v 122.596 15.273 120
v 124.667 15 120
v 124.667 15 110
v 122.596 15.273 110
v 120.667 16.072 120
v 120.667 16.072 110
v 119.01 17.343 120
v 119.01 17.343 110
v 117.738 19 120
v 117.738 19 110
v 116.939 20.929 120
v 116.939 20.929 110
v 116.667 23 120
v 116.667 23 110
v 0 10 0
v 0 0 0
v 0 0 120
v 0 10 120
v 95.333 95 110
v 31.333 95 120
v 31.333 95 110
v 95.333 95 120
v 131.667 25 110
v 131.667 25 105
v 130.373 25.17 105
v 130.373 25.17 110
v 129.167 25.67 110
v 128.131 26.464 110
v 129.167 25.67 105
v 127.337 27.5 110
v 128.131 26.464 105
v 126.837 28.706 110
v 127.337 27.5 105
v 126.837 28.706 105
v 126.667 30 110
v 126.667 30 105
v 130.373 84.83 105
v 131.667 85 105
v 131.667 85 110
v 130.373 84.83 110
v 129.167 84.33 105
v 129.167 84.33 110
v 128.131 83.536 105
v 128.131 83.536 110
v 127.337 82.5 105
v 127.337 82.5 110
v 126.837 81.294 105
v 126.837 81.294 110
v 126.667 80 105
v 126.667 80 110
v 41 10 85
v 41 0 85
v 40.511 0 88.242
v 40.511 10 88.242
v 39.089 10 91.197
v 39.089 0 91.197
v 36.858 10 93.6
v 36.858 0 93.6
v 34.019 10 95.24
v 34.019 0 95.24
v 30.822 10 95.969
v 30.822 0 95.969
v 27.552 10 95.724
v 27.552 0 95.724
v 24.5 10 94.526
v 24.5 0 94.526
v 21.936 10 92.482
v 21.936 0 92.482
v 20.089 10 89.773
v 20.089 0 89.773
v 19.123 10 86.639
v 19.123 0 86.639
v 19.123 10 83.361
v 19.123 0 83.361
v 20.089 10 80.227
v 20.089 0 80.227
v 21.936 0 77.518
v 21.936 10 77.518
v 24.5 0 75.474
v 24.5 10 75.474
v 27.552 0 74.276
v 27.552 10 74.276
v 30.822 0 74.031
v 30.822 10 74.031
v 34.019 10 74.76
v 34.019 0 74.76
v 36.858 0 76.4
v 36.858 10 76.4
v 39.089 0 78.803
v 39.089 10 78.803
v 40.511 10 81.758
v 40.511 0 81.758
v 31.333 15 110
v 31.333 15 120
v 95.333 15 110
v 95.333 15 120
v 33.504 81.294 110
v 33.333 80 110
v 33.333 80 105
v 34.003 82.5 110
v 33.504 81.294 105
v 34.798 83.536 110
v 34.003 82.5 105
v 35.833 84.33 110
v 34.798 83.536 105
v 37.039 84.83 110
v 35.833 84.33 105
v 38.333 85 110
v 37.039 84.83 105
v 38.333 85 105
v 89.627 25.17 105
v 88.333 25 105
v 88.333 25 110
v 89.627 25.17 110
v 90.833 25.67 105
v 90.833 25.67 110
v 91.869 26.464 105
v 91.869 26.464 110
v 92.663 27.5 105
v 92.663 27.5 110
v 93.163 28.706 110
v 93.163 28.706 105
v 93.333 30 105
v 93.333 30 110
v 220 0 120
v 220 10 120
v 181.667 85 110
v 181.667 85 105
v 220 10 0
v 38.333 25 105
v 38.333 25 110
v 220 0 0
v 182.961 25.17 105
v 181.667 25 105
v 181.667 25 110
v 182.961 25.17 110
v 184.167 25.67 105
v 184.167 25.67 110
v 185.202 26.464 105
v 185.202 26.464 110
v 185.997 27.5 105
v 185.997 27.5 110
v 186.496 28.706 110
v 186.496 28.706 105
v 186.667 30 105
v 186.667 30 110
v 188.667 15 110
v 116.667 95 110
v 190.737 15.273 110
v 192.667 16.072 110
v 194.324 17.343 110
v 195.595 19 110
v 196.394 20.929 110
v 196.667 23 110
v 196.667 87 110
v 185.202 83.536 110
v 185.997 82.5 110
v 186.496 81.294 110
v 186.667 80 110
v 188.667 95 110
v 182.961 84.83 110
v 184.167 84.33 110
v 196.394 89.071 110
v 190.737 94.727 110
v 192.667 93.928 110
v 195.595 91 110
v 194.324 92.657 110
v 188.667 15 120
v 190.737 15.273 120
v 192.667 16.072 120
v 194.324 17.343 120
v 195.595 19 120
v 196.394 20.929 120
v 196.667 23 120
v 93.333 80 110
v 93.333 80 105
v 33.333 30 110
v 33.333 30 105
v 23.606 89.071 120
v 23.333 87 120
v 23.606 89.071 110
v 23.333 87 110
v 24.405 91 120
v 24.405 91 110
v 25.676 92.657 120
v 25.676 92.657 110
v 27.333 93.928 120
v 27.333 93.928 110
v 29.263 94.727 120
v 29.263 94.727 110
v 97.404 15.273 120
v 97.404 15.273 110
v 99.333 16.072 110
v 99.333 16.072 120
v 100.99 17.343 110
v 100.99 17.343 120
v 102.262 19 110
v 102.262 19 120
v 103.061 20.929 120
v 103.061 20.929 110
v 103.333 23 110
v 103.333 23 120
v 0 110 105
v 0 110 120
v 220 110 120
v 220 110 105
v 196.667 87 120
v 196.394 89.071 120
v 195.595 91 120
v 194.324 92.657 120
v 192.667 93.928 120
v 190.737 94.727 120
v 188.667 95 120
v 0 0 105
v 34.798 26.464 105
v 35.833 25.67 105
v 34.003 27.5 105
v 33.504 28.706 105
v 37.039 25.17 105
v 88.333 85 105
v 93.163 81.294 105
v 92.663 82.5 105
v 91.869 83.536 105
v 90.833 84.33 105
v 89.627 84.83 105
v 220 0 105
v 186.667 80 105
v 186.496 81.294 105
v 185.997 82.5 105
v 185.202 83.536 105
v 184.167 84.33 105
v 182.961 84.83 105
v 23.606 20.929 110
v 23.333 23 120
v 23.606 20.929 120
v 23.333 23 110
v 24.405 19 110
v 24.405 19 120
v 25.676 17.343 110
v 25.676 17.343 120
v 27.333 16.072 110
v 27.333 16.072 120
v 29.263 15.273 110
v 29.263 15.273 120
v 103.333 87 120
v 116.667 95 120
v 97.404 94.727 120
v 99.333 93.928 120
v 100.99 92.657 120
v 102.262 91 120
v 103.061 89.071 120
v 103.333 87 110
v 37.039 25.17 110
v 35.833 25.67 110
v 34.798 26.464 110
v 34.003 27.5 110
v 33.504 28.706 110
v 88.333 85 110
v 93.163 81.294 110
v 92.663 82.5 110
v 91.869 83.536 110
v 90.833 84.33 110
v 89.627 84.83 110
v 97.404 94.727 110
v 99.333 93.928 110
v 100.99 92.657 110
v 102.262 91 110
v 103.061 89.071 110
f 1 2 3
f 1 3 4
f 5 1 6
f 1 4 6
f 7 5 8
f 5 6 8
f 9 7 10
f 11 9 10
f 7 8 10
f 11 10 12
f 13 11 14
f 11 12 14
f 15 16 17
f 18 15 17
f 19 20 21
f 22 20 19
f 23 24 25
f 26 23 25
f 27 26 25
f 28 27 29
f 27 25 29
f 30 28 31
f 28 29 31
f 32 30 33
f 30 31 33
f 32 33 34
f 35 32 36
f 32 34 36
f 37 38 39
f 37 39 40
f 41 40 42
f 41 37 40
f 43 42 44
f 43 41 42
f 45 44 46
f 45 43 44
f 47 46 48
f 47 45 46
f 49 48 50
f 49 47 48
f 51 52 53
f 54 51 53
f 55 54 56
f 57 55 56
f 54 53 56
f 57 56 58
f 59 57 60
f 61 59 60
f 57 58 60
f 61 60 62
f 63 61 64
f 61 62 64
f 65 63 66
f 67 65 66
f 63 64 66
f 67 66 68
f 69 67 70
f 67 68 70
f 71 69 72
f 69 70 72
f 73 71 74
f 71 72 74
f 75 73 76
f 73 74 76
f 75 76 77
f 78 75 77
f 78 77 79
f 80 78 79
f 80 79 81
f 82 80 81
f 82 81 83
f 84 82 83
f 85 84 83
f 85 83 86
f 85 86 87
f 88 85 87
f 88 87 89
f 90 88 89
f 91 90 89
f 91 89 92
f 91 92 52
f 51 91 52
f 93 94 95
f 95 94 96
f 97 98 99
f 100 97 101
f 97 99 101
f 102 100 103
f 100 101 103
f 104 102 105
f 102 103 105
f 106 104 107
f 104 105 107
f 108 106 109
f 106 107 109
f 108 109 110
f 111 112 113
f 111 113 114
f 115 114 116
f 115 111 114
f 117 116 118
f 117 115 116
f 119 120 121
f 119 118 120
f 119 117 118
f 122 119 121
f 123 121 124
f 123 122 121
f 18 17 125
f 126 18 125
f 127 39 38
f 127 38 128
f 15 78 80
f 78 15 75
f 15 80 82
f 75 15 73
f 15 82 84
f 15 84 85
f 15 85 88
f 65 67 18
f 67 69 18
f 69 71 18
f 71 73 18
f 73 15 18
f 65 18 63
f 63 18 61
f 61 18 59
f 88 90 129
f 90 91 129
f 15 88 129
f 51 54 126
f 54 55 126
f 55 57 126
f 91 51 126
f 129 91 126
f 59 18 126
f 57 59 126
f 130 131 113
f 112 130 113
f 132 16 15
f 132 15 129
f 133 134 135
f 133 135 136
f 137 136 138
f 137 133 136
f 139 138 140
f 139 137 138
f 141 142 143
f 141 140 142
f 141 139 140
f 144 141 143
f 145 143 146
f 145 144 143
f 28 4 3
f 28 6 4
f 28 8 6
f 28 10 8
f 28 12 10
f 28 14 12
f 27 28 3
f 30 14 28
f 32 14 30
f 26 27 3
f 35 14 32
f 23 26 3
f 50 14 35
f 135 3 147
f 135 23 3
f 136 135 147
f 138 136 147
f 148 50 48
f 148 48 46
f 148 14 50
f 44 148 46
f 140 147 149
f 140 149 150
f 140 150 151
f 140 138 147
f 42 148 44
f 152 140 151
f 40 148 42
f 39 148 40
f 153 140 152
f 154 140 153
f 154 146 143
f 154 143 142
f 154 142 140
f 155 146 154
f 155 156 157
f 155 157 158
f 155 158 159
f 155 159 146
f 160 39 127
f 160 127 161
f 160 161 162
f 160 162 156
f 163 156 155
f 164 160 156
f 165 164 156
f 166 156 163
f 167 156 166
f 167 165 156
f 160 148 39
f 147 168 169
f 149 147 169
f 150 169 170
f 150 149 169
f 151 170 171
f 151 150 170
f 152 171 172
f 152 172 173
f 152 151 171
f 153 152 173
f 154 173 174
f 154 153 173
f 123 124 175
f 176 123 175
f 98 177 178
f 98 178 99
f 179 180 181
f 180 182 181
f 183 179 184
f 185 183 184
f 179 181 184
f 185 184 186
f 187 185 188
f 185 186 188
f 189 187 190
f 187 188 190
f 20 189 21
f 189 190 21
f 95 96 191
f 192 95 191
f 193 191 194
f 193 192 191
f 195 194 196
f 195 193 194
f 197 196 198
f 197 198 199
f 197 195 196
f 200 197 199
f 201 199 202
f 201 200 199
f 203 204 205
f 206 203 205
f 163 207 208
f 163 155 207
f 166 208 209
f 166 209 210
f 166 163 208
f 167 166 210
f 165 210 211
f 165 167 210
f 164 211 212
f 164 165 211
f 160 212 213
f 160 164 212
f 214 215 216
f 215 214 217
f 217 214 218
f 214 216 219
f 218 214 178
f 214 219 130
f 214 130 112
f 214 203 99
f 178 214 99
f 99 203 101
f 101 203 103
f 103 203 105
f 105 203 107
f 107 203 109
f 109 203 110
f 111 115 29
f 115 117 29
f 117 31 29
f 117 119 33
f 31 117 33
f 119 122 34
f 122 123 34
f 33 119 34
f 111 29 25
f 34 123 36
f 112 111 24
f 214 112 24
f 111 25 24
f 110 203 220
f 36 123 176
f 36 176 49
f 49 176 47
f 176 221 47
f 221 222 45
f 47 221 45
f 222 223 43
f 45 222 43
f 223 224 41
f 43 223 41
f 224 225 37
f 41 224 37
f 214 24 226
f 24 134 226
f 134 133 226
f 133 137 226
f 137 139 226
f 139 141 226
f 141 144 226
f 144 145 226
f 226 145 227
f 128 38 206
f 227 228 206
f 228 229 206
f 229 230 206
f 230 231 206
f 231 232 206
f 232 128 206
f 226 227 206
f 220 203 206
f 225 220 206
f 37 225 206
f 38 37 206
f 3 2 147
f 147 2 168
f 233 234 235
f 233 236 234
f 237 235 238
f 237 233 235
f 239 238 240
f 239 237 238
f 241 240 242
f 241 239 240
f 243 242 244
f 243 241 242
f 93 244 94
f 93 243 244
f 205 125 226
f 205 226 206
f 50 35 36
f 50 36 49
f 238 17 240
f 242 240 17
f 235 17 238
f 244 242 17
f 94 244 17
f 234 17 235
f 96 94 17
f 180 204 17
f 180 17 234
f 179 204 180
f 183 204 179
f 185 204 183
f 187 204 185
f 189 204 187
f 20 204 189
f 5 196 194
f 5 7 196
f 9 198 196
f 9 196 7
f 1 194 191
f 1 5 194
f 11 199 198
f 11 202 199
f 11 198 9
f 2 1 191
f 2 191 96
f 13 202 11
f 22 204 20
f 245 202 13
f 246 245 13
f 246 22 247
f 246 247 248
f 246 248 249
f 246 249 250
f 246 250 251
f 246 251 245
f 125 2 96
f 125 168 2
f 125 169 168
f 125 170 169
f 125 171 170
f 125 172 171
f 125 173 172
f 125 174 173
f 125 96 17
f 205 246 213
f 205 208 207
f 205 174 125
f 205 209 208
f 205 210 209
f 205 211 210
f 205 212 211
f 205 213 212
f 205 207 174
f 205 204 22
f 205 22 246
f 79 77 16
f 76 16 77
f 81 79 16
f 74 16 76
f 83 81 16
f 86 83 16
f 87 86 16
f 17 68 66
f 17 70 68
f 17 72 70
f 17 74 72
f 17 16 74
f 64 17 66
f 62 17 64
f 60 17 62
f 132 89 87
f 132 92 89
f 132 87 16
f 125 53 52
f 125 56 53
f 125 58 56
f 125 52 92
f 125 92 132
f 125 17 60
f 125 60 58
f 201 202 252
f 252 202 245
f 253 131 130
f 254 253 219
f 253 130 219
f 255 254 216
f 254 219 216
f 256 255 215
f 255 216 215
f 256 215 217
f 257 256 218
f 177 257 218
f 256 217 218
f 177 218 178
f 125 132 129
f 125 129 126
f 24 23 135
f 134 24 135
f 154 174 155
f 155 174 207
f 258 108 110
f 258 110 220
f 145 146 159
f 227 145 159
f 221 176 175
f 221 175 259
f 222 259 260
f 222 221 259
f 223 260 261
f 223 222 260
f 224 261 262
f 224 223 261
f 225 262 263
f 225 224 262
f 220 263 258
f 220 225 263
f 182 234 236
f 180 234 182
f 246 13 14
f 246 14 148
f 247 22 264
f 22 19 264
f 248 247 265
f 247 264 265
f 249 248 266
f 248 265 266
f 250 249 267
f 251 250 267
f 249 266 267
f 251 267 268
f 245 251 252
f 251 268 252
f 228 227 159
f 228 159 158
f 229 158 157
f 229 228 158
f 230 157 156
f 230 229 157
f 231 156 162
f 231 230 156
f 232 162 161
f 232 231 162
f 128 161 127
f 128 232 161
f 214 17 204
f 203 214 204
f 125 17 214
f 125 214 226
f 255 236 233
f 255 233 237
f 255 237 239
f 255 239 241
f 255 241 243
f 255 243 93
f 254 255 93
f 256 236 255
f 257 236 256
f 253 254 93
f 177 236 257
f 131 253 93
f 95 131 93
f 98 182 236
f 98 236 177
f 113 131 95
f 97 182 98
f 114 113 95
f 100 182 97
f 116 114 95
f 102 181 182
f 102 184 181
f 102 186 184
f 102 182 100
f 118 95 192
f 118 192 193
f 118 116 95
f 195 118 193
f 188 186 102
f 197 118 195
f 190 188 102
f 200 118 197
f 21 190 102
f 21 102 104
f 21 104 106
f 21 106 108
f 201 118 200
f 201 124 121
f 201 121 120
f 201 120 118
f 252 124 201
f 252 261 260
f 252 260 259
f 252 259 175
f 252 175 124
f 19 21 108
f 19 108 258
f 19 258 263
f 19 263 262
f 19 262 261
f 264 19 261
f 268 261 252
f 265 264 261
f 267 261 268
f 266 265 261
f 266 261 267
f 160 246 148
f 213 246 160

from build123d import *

# Parameters (mm, degrees)
F5_W      = 220
F5_H      = 110
F5_W_2    = 60
F5_H_2    = 60
F6_DEPTH  = 15
F7_R      = 5
F8_W      = 80
F8_H      = 80
F9_DEPTH  = 10
F10_R     = 8
F3_W      = 220
F3_H      = 120
F11_DEPTH = 10
F4_R      = 11
F12_DEPTH = 25


with BuildPart() as f6:
    # F5 (on offset) → F6 (new body)
    with BuildSketch(Plane.XY.offset(120)):
        with Locations((110, 55)):
            Rectangle(F5_W, F5_H)
        with Locations((63.333333, 55)):
            Rectangle(F5_W_2, F5_H_2, mode=Mode.SUBTRACT)
        with Locations((156.666667, 55)):
            Rectangle(F5_W_2, F5_H_2, mode=Mode.SUBTRACT)
    extrude(amount=-F6_DEPTH)

    # F7
    f7_edges = [f6.edges().sort_by_distance(p)[0] for p in [
        (93.333333, 85, 112.5),
        (186.666667, 85, 112.5),
        (33.333333, 85, 112.5),
        (33.333333, 25, 112.5),
        (93.333333, 25, 112.5),
        (186.666667, 25, 112.5),
        (126.666667, 25, 112.5),
        (126.666667, 85, 112.5),
    ]]
    fillet(f7_edges, radius=F7_R)

    # F8 (on offset) → F9 (cut)
    with BuildSketch(Plane.XY.offset(120)):
        with Locations((63.333333, 55)):
            Rectangle(F8_W, F8_H)
        with Locations((156.666667, 55)):
            Rectangle(F8_W, F8_H)
    extrude(amount=-F9_DEPTH, mode=Mode.SUBTRACT)

    # F10
    f10_edges = [f6.edges().sort_by_distance(p)[0] for p in [
        (103.333333, 95, 115),
        (196.666667, 95, 115),
        (23.333333, 95, 115),
        (23.333333, 15, 115),
        (103.333333, 15, 115),
        (196.666667, 15, 115),
        (116.666667, 15, 115),
    ]]
    fillet(f10_edges, radius=F10_R)


with BuildPart() as f11:
    # F3 (on Front) → F11 (new body)
    with BuildSketch(Plane.XZ):
        with Locations((110, 60)):
            Rectangle(F3_W, F3_H)
    extrude(amount=-F11_DEPTH)

    # F4 (on Front) → F12 (cut)
    with BuildSketch(Plane.XZ):
        with Locations((30, 85)):
            Circle(F4_R)
    extrude(amount=-F12_DEPTH, mode=Mode.SUBTRACT)


solid = Compound([f6.part, f11.part])
